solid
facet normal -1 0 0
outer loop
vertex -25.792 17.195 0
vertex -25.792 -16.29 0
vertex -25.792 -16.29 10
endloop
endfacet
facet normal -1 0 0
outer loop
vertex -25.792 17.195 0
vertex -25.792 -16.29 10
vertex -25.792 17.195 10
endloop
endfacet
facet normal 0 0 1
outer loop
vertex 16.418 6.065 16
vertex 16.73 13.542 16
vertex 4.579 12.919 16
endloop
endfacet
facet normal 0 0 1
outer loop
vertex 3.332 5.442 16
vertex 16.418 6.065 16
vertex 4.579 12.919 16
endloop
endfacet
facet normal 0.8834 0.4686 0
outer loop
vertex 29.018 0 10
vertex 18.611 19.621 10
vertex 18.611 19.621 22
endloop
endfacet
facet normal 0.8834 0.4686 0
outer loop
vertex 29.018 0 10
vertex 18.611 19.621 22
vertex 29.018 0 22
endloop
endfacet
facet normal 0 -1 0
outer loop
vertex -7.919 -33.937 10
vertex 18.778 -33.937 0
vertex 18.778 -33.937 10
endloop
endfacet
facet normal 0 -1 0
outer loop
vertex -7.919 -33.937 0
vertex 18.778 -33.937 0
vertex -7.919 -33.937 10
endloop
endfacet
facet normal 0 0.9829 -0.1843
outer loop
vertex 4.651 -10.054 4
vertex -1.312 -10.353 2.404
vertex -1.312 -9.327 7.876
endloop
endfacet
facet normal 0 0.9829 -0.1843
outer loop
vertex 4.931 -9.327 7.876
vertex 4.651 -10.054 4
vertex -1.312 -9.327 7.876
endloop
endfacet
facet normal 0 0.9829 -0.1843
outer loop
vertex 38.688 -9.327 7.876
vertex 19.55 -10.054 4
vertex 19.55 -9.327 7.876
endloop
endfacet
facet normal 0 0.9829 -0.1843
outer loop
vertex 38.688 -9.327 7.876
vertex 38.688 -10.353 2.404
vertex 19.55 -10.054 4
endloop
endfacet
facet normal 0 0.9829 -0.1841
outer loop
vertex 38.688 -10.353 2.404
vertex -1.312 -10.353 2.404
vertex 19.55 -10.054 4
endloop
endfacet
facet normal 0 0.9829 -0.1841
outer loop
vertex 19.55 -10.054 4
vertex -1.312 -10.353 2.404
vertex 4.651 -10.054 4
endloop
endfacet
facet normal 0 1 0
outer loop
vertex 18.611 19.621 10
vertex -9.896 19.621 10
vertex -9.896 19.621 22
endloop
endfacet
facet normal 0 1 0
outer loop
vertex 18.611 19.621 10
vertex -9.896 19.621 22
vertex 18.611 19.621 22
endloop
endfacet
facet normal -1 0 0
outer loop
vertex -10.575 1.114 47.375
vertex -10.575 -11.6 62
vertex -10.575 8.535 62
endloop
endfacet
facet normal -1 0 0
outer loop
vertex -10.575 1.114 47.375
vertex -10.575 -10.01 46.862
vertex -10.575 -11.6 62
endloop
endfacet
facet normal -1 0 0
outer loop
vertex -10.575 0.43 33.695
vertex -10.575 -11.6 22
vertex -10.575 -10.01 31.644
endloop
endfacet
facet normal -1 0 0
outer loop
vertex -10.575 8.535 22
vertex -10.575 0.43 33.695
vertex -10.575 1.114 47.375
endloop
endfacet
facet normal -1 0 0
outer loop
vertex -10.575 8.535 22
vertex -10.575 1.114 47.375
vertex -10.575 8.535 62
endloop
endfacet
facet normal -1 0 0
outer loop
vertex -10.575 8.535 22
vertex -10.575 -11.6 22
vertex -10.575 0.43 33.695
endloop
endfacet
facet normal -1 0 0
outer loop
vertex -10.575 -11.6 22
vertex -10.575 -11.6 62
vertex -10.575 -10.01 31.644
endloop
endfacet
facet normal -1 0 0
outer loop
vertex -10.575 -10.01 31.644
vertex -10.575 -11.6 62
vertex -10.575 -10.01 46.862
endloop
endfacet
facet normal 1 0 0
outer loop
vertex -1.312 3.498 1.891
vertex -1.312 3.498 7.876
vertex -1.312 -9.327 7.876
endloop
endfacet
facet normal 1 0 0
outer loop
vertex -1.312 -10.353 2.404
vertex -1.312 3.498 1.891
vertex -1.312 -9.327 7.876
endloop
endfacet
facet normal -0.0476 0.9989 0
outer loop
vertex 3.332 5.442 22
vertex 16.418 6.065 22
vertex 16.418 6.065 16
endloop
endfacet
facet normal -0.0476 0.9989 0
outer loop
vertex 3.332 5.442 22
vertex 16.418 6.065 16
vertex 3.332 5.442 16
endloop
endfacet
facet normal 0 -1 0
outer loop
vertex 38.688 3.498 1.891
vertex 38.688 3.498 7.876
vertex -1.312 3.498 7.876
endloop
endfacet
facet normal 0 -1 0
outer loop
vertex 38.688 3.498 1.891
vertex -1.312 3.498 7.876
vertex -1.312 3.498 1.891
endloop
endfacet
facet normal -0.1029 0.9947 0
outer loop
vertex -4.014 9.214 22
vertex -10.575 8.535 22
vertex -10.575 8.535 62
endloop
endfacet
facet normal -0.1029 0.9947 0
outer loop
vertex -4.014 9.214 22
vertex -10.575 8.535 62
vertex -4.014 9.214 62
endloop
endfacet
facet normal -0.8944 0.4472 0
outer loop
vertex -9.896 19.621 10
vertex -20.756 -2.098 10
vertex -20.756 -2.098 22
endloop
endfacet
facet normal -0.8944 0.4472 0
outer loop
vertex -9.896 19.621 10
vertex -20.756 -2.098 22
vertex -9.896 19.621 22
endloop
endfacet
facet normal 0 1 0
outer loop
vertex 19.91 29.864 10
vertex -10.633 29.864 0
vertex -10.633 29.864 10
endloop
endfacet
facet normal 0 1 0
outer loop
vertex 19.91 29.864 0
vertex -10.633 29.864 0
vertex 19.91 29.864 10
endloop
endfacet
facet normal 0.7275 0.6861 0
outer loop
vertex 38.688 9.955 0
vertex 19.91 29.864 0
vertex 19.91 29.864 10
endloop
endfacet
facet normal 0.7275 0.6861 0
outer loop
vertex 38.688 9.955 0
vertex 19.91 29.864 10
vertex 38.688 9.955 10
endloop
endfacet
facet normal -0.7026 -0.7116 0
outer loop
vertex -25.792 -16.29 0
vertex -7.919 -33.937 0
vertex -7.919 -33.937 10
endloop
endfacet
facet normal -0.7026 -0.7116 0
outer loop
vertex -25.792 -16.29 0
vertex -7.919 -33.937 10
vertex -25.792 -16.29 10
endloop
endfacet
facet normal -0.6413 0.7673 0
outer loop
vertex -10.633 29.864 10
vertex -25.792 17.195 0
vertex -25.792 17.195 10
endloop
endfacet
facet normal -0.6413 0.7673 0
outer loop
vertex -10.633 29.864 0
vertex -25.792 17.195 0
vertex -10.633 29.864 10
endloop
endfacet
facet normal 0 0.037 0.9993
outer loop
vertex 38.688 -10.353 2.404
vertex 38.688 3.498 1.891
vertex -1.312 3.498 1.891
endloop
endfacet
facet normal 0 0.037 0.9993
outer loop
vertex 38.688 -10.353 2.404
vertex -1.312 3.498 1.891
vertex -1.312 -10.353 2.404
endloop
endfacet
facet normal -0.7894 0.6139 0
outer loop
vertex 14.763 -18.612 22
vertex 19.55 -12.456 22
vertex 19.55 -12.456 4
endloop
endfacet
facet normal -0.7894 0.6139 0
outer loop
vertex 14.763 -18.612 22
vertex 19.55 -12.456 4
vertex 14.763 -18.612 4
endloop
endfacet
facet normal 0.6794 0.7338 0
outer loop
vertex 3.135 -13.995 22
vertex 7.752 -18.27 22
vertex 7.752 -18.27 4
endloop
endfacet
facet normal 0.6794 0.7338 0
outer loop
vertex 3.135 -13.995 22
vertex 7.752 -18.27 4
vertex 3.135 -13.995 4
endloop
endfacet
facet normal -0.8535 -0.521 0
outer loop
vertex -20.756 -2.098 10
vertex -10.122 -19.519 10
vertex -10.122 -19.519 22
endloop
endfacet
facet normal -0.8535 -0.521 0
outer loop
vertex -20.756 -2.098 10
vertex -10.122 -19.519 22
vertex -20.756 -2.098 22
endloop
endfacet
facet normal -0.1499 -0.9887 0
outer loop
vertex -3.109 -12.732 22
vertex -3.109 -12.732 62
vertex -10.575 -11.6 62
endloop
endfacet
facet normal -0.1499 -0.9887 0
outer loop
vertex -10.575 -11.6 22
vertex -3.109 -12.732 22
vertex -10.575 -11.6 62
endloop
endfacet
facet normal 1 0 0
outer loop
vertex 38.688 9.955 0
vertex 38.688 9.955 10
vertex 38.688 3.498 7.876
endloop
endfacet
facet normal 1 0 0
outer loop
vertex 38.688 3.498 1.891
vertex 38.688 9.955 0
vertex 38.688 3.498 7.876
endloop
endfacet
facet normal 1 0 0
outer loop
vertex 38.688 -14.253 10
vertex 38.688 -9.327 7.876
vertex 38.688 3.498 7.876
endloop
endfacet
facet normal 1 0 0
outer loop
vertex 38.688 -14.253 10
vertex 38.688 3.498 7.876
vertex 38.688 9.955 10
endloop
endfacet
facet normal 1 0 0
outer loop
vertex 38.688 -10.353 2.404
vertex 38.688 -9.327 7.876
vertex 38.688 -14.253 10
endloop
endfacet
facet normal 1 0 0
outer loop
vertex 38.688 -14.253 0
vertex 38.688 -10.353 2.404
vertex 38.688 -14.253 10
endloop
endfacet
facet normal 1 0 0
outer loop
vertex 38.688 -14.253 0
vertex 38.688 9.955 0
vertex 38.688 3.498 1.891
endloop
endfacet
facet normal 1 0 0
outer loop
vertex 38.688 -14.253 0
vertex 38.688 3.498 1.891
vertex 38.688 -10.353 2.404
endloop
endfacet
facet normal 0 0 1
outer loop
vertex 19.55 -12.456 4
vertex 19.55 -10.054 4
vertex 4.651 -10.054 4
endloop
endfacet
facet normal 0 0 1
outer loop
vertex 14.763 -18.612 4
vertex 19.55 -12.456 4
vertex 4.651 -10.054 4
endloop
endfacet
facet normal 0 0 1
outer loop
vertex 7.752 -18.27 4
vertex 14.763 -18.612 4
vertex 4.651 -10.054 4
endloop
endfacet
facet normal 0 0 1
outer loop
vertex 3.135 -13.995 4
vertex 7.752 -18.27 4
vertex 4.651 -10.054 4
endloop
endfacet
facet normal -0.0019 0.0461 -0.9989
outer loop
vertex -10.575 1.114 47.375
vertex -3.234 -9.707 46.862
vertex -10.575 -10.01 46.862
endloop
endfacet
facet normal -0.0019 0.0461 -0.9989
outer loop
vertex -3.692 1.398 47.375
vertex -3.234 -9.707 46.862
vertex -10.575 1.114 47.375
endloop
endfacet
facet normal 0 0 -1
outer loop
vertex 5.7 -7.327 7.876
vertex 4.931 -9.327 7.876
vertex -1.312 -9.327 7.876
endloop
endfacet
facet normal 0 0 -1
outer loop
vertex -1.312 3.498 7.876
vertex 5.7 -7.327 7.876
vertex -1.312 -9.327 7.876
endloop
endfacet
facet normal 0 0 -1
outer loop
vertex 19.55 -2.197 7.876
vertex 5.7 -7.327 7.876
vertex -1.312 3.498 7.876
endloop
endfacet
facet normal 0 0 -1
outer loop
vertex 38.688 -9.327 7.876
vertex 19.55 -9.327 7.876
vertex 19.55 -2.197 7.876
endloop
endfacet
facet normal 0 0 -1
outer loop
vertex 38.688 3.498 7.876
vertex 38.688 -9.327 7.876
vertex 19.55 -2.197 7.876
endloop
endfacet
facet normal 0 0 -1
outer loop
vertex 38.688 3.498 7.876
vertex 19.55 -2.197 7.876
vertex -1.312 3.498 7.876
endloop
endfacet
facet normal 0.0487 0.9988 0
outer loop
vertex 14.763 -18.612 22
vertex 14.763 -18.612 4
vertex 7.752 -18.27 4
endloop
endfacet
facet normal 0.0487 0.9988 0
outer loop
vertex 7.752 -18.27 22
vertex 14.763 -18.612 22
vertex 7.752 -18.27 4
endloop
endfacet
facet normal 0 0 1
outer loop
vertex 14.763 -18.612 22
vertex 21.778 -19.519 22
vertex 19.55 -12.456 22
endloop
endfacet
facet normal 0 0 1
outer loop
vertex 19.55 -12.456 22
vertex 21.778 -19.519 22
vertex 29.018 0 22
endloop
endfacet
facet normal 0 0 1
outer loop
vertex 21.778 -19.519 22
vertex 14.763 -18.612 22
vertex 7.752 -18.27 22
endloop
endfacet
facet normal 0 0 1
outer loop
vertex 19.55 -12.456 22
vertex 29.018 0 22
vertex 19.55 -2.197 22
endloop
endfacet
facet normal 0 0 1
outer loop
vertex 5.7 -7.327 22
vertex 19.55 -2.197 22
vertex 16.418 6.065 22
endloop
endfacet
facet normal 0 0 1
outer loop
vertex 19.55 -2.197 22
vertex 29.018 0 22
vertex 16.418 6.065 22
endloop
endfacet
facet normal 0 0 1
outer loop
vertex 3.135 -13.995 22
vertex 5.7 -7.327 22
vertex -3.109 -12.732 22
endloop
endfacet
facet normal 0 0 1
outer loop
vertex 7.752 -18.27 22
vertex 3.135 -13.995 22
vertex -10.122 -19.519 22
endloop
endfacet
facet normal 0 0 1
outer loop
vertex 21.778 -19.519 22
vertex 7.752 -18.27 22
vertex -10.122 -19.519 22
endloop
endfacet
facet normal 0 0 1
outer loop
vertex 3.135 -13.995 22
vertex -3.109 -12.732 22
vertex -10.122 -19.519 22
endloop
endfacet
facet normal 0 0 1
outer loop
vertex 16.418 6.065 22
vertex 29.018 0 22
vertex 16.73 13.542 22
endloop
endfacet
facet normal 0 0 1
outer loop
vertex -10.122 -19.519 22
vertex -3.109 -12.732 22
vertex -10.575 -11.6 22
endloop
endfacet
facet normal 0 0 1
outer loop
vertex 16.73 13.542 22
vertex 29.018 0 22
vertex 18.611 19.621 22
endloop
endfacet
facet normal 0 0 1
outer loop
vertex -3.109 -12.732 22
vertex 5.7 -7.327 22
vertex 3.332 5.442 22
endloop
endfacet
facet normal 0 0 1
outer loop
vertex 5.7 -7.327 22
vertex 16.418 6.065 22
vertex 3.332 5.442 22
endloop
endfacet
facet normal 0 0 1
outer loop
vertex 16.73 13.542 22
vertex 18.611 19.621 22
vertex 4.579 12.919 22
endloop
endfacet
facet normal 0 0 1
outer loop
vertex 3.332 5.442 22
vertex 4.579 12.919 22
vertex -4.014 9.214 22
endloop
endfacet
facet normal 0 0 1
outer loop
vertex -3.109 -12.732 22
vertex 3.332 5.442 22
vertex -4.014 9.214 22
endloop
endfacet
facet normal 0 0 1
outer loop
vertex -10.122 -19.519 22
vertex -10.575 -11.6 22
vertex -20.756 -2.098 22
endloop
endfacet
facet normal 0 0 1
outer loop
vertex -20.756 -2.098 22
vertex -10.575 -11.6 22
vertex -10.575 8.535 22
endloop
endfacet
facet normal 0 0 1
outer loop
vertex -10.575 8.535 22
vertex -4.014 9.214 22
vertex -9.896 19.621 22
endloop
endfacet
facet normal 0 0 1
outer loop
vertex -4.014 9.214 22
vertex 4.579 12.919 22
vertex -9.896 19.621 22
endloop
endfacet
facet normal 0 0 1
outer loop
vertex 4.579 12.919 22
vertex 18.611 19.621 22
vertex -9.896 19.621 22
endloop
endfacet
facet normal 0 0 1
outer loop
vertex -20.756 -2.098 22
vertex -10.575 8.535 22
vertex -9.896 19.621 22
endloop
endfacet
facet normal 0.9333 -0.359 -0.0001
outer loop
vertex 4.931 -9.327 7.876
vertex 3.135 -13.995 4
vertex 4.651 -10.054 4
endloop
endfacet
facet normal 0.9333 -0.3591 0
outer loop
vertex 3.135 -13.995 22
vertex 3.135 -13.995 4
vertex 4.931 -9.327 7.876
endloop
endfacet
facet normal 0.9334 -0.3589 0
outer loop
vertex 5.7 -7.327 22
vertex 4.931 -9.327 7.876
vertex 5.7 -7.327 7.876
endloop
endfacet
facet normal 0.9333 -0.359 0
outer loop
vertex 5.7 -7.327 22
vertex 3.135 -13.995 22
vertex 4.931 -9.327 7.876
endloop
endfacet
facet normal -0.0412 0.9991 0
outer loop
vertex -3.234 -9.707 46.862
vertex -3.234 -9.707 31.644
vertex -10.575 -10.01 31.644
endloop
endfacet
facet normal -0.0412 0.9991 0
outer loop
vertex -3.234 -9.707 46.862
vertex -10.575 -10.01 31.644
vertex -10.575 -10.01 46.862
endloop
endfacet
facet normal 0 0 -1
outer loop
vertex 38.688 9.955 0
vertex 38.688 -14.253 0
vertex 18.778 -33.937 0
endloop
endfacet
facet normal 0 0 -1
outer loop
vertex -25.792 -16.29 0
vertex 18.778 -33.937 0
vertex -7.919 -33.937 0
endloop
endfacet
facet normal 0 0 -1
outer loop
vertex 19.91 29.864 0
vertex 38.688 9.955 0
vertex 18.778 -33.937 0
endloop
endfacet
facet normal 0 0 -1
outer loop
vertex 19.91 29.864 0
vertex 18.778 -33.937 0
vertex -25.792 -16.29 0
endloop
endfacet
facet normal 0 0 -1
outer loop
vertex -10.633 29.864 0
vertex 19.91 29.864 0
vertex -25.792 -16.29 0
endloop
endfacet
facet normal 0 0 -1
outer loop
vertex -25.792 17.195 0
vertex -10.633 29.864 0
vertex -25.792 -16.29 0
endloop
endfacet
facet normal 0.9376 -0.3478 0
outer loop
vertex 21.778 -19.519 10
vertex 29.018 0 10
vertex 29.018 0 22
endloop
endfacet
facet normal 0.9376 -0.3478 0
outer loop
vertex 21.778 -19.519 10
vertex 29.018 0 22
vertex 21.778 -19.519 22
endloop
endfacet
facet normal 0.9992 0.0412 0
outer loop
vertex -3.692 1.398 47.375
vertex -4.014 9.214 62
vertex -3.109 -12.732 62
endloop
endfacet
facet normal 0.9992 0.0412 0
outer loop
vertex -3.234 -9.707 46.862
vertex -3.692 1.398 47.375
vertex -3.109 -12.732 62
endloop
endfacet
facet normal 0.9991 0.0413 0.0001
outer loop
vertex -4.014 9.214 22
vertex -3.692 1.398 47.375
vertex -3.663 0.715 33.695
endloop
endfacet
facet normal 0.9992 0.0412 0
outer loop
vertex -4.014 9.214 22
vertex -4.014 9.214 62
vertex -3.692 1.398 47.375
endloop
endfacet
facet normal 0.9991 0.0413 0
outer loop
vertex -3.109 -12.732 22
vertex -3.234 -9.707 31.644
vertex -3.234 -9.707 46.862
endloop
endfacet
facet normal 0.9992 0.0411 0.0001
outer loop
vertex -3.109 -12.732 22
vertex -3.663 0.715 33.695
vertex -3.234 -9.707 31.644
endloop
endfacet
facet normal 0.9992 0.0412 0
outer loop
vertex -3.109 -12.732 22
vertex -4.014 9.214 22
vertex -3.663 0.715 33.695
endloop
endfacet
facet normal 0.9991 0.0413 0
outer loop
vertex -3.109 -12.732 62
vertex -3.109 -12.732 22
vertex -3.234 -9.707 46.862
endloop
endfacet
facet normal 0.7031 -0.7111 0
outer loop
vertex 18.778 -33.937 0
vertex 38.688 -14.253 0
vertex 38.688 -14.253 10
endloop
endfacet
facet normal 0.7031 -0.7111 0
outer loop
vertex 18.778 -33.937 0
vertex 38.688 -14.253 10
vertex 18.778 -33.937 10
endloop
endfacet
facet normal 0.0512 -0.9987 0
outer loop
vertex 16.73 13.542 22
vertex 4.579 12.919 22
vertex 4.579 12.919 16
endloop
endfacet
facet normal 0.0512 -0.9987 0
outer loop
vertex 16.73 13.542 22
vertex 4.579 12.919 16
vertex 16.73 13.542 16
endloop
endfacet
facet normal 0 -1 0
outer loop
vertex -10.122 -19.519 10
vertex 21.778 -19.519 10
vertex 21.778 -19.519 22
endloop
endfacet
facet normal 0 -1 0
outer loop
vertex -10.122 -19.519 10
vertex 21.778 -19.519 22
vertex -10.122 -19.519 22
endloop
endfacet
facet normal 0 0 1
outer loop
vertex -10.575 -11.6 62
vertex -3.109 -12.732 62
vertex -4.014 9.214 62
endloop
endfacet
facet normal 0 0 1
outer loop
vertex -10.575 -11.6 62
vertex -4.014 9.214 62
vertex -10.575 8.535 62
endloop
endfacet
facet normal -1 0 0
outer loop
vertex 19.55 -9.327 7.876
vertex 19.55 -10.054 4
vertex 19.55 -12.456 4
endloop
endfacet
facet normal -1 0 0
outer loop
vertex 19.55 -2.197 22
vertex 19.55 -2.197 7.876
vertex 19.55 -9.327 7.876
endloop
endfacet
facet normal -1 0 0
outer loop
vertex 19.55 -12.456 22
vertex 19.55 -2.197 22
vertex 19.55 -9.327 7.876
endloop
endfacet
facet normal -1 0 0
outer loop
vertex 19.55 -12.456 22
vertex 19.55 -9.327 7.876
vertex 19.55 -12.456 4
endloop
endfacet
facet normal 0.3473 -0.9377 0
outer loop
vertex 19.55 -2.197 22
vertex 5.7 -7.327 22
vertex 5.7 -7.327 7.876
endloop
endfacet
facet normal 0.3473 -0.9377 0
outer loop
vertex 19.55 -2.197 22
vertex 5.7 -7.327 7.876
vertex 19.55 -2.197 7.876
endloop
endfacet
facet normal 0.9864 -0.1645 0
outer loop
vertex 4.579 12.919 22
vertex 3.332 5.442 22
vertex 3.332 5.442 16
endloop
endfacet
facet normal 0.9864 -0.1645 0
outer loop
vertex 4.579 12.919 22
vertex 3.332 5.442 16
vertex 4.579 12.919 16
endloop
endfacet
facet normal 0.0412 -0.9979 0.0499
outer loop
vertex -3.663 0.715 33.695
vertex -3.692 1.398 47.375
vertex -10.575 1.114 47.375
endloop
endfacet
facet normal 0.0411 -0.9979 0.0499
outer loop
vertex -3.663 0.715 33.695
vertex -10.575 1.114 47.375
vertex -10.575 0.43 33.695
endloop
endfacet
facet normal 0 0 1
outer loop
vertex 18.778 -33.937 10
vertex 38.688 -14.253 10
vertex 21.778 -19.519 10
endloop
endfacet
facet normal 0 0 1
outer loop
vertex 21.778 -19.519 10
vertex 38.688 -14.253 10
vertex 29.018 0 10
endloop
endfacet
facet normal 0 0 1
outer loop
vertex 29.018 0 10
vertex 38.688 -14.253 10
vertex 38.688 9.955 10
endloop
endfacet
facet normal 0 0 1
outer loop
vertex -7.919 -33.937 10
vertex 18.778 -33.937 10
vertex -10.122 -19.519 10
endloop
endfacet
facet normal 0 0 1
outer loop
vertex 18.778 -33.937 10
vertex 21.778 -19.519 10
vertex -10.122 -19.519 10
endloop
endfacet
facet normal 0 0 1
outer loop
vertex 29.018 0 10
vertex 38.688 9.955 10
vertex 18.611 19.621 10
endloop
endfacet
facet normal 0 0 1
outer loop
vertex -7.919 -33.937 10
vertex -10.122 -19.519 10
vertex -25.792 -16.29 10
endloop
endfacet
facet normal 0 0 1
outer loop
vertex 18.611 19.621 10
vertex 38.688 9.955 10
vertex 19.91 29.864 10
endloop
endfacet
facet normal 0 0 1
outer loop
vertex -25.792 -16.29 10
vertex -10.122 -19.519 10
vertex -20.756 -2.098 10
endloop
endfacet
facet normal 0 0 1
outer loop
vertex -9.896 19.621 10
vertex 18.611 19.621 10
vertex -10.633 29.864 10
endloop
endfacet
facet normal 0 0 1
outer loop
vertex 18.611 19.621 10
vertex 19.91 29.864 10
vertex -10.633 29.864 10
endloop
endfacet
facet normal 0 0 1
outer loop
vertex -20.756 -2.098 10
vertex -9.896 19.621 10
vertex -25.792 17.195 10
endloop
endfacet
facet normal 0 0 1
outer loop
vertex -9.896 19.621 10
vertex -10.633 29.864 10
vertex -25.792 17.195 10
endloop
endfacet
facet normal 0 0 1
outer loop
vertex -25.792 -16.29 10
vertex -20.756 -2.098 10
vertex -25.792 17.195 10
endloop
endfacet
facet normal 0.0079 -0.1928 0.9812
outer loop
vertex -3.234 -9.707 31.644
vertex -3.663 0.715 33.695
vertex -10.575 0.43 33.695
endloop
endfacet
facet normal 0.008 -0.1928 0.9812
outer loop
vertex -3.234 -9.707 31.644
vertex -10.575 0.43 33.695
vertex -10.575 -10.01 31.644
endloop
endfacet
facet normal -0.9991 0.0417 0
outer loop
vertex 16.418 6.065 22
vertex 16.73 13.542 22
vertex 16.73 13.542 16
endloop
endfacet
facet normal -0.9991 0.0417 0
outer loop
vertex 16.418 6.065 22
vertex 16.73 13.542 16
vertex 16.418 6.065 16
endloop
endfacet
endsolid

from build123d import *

# Parameters (mm, degrees)
PAD_DEPTH       = 10
PAD001_DEPTH    = 12
PAD002_DEPTH    = 40
POCKET_DEPTH    = 6
POCKET001_DEPTH = 18
POCKET002_DEPTH = 9
POCKET003_DEPTH = 40


with BuildPart() as part:
    # Sketch → Pad (new body)
    with BuildSketch(Plane.XY):
        Polygon((-10.633484, 29.864252), (19.9095, 29.864252), (38.687782, 9.95475), (38.687782, -14.253396), (18.778282, -33.936649), (-7.918551, -33.936649), (-25.791855, -16.289593), (-25.791855, 17.194569), align=None)
    extrude(amount=PAD_DEPTH)

    # Sketch002 (on Face10 of Pad) → Pad001 (join)
    with BuildSketch(Plane.XY.offset(10)):
        Polygon((-9.896216, 19.621426), (18.610573, 19.621426), (29.017811, 0), (21.777992, -19.518847), (-10.12246, -19.518847), (-20.755943, -2.09803), align=None)
    extrude(amount=PAD001_DEPTH)

    # Sketch003 (on Face17 of Pad001) → Pad002 (join)
    with BuildSketch(Plane.XY.offset(22)):
        Polygon((-10.574949, 8.535451), (-4.013864, 9.214187), (-3.108886, -12.731516), (-10.574949, -11.600292), align=None)
    extrude(amount=PAD002_DEPTH)

    # Sketch004 (on Face17 of Pad002) → Pocket (cut)
    with BuildSketch(Plane.XY.offset(22)):
        Polygon((4.578534, 12.919245), (16.729834, 13.542388), (16.418259, 6.064667), (3.332247, 5.441524), align=None)
    extrude(amount=-POCKET_DEPTH, mode=Mode.SUBTRACT)

    # Sketch005 (on Face17 of Pocket) → Pocket001 (cut)
    with BuildSketch(Plane.XY.offset(22)):
        Polygon((5.699865, -7.326652), (19.550392, -2.196826), (19.550392, -12.456478), (14.762555, -18.612268), (7.751796, -18.270281), (3.13495, -13.995423), align=None)
    extrude(amount=-POCKET001_DEPTH, mode=Mode.SUBTRACT)

    # Sketch006 (on Face27 of Pocket001) → Pocket002 (cut)
    with BuildSketch(Plane(origin=(-3.6277283341, -0.1495971367, 0), x_dir=(-0.0412021215, 0.999150832, 0), z_dir=(0.999150832, 0.0412021215, 0))):
        Polygon((-9.565722, 46.86203), (1.548902, 47.375011), (0.864925, 33.695477), (-9.565722, 31.643547), align=None)
    extrude(amount=-POCKET002_DEPTH, mode=Mode.SUBTRACT)

    # Sketch008 (on Face7 of Pocket002) → Pocket003 (cut)
    with BuildSketch(Plane.YZ.offset(38.687782)):
        Polygon((-9.326732, 7.876174), (3.497833, 7.876174), (3.497833, 1.89138), (-10.352697, 2.404365), align=None)
    extrude(amount=-POCKET003_DEPTH, mode=Mode.SUBTRACT)


solid = part.part
